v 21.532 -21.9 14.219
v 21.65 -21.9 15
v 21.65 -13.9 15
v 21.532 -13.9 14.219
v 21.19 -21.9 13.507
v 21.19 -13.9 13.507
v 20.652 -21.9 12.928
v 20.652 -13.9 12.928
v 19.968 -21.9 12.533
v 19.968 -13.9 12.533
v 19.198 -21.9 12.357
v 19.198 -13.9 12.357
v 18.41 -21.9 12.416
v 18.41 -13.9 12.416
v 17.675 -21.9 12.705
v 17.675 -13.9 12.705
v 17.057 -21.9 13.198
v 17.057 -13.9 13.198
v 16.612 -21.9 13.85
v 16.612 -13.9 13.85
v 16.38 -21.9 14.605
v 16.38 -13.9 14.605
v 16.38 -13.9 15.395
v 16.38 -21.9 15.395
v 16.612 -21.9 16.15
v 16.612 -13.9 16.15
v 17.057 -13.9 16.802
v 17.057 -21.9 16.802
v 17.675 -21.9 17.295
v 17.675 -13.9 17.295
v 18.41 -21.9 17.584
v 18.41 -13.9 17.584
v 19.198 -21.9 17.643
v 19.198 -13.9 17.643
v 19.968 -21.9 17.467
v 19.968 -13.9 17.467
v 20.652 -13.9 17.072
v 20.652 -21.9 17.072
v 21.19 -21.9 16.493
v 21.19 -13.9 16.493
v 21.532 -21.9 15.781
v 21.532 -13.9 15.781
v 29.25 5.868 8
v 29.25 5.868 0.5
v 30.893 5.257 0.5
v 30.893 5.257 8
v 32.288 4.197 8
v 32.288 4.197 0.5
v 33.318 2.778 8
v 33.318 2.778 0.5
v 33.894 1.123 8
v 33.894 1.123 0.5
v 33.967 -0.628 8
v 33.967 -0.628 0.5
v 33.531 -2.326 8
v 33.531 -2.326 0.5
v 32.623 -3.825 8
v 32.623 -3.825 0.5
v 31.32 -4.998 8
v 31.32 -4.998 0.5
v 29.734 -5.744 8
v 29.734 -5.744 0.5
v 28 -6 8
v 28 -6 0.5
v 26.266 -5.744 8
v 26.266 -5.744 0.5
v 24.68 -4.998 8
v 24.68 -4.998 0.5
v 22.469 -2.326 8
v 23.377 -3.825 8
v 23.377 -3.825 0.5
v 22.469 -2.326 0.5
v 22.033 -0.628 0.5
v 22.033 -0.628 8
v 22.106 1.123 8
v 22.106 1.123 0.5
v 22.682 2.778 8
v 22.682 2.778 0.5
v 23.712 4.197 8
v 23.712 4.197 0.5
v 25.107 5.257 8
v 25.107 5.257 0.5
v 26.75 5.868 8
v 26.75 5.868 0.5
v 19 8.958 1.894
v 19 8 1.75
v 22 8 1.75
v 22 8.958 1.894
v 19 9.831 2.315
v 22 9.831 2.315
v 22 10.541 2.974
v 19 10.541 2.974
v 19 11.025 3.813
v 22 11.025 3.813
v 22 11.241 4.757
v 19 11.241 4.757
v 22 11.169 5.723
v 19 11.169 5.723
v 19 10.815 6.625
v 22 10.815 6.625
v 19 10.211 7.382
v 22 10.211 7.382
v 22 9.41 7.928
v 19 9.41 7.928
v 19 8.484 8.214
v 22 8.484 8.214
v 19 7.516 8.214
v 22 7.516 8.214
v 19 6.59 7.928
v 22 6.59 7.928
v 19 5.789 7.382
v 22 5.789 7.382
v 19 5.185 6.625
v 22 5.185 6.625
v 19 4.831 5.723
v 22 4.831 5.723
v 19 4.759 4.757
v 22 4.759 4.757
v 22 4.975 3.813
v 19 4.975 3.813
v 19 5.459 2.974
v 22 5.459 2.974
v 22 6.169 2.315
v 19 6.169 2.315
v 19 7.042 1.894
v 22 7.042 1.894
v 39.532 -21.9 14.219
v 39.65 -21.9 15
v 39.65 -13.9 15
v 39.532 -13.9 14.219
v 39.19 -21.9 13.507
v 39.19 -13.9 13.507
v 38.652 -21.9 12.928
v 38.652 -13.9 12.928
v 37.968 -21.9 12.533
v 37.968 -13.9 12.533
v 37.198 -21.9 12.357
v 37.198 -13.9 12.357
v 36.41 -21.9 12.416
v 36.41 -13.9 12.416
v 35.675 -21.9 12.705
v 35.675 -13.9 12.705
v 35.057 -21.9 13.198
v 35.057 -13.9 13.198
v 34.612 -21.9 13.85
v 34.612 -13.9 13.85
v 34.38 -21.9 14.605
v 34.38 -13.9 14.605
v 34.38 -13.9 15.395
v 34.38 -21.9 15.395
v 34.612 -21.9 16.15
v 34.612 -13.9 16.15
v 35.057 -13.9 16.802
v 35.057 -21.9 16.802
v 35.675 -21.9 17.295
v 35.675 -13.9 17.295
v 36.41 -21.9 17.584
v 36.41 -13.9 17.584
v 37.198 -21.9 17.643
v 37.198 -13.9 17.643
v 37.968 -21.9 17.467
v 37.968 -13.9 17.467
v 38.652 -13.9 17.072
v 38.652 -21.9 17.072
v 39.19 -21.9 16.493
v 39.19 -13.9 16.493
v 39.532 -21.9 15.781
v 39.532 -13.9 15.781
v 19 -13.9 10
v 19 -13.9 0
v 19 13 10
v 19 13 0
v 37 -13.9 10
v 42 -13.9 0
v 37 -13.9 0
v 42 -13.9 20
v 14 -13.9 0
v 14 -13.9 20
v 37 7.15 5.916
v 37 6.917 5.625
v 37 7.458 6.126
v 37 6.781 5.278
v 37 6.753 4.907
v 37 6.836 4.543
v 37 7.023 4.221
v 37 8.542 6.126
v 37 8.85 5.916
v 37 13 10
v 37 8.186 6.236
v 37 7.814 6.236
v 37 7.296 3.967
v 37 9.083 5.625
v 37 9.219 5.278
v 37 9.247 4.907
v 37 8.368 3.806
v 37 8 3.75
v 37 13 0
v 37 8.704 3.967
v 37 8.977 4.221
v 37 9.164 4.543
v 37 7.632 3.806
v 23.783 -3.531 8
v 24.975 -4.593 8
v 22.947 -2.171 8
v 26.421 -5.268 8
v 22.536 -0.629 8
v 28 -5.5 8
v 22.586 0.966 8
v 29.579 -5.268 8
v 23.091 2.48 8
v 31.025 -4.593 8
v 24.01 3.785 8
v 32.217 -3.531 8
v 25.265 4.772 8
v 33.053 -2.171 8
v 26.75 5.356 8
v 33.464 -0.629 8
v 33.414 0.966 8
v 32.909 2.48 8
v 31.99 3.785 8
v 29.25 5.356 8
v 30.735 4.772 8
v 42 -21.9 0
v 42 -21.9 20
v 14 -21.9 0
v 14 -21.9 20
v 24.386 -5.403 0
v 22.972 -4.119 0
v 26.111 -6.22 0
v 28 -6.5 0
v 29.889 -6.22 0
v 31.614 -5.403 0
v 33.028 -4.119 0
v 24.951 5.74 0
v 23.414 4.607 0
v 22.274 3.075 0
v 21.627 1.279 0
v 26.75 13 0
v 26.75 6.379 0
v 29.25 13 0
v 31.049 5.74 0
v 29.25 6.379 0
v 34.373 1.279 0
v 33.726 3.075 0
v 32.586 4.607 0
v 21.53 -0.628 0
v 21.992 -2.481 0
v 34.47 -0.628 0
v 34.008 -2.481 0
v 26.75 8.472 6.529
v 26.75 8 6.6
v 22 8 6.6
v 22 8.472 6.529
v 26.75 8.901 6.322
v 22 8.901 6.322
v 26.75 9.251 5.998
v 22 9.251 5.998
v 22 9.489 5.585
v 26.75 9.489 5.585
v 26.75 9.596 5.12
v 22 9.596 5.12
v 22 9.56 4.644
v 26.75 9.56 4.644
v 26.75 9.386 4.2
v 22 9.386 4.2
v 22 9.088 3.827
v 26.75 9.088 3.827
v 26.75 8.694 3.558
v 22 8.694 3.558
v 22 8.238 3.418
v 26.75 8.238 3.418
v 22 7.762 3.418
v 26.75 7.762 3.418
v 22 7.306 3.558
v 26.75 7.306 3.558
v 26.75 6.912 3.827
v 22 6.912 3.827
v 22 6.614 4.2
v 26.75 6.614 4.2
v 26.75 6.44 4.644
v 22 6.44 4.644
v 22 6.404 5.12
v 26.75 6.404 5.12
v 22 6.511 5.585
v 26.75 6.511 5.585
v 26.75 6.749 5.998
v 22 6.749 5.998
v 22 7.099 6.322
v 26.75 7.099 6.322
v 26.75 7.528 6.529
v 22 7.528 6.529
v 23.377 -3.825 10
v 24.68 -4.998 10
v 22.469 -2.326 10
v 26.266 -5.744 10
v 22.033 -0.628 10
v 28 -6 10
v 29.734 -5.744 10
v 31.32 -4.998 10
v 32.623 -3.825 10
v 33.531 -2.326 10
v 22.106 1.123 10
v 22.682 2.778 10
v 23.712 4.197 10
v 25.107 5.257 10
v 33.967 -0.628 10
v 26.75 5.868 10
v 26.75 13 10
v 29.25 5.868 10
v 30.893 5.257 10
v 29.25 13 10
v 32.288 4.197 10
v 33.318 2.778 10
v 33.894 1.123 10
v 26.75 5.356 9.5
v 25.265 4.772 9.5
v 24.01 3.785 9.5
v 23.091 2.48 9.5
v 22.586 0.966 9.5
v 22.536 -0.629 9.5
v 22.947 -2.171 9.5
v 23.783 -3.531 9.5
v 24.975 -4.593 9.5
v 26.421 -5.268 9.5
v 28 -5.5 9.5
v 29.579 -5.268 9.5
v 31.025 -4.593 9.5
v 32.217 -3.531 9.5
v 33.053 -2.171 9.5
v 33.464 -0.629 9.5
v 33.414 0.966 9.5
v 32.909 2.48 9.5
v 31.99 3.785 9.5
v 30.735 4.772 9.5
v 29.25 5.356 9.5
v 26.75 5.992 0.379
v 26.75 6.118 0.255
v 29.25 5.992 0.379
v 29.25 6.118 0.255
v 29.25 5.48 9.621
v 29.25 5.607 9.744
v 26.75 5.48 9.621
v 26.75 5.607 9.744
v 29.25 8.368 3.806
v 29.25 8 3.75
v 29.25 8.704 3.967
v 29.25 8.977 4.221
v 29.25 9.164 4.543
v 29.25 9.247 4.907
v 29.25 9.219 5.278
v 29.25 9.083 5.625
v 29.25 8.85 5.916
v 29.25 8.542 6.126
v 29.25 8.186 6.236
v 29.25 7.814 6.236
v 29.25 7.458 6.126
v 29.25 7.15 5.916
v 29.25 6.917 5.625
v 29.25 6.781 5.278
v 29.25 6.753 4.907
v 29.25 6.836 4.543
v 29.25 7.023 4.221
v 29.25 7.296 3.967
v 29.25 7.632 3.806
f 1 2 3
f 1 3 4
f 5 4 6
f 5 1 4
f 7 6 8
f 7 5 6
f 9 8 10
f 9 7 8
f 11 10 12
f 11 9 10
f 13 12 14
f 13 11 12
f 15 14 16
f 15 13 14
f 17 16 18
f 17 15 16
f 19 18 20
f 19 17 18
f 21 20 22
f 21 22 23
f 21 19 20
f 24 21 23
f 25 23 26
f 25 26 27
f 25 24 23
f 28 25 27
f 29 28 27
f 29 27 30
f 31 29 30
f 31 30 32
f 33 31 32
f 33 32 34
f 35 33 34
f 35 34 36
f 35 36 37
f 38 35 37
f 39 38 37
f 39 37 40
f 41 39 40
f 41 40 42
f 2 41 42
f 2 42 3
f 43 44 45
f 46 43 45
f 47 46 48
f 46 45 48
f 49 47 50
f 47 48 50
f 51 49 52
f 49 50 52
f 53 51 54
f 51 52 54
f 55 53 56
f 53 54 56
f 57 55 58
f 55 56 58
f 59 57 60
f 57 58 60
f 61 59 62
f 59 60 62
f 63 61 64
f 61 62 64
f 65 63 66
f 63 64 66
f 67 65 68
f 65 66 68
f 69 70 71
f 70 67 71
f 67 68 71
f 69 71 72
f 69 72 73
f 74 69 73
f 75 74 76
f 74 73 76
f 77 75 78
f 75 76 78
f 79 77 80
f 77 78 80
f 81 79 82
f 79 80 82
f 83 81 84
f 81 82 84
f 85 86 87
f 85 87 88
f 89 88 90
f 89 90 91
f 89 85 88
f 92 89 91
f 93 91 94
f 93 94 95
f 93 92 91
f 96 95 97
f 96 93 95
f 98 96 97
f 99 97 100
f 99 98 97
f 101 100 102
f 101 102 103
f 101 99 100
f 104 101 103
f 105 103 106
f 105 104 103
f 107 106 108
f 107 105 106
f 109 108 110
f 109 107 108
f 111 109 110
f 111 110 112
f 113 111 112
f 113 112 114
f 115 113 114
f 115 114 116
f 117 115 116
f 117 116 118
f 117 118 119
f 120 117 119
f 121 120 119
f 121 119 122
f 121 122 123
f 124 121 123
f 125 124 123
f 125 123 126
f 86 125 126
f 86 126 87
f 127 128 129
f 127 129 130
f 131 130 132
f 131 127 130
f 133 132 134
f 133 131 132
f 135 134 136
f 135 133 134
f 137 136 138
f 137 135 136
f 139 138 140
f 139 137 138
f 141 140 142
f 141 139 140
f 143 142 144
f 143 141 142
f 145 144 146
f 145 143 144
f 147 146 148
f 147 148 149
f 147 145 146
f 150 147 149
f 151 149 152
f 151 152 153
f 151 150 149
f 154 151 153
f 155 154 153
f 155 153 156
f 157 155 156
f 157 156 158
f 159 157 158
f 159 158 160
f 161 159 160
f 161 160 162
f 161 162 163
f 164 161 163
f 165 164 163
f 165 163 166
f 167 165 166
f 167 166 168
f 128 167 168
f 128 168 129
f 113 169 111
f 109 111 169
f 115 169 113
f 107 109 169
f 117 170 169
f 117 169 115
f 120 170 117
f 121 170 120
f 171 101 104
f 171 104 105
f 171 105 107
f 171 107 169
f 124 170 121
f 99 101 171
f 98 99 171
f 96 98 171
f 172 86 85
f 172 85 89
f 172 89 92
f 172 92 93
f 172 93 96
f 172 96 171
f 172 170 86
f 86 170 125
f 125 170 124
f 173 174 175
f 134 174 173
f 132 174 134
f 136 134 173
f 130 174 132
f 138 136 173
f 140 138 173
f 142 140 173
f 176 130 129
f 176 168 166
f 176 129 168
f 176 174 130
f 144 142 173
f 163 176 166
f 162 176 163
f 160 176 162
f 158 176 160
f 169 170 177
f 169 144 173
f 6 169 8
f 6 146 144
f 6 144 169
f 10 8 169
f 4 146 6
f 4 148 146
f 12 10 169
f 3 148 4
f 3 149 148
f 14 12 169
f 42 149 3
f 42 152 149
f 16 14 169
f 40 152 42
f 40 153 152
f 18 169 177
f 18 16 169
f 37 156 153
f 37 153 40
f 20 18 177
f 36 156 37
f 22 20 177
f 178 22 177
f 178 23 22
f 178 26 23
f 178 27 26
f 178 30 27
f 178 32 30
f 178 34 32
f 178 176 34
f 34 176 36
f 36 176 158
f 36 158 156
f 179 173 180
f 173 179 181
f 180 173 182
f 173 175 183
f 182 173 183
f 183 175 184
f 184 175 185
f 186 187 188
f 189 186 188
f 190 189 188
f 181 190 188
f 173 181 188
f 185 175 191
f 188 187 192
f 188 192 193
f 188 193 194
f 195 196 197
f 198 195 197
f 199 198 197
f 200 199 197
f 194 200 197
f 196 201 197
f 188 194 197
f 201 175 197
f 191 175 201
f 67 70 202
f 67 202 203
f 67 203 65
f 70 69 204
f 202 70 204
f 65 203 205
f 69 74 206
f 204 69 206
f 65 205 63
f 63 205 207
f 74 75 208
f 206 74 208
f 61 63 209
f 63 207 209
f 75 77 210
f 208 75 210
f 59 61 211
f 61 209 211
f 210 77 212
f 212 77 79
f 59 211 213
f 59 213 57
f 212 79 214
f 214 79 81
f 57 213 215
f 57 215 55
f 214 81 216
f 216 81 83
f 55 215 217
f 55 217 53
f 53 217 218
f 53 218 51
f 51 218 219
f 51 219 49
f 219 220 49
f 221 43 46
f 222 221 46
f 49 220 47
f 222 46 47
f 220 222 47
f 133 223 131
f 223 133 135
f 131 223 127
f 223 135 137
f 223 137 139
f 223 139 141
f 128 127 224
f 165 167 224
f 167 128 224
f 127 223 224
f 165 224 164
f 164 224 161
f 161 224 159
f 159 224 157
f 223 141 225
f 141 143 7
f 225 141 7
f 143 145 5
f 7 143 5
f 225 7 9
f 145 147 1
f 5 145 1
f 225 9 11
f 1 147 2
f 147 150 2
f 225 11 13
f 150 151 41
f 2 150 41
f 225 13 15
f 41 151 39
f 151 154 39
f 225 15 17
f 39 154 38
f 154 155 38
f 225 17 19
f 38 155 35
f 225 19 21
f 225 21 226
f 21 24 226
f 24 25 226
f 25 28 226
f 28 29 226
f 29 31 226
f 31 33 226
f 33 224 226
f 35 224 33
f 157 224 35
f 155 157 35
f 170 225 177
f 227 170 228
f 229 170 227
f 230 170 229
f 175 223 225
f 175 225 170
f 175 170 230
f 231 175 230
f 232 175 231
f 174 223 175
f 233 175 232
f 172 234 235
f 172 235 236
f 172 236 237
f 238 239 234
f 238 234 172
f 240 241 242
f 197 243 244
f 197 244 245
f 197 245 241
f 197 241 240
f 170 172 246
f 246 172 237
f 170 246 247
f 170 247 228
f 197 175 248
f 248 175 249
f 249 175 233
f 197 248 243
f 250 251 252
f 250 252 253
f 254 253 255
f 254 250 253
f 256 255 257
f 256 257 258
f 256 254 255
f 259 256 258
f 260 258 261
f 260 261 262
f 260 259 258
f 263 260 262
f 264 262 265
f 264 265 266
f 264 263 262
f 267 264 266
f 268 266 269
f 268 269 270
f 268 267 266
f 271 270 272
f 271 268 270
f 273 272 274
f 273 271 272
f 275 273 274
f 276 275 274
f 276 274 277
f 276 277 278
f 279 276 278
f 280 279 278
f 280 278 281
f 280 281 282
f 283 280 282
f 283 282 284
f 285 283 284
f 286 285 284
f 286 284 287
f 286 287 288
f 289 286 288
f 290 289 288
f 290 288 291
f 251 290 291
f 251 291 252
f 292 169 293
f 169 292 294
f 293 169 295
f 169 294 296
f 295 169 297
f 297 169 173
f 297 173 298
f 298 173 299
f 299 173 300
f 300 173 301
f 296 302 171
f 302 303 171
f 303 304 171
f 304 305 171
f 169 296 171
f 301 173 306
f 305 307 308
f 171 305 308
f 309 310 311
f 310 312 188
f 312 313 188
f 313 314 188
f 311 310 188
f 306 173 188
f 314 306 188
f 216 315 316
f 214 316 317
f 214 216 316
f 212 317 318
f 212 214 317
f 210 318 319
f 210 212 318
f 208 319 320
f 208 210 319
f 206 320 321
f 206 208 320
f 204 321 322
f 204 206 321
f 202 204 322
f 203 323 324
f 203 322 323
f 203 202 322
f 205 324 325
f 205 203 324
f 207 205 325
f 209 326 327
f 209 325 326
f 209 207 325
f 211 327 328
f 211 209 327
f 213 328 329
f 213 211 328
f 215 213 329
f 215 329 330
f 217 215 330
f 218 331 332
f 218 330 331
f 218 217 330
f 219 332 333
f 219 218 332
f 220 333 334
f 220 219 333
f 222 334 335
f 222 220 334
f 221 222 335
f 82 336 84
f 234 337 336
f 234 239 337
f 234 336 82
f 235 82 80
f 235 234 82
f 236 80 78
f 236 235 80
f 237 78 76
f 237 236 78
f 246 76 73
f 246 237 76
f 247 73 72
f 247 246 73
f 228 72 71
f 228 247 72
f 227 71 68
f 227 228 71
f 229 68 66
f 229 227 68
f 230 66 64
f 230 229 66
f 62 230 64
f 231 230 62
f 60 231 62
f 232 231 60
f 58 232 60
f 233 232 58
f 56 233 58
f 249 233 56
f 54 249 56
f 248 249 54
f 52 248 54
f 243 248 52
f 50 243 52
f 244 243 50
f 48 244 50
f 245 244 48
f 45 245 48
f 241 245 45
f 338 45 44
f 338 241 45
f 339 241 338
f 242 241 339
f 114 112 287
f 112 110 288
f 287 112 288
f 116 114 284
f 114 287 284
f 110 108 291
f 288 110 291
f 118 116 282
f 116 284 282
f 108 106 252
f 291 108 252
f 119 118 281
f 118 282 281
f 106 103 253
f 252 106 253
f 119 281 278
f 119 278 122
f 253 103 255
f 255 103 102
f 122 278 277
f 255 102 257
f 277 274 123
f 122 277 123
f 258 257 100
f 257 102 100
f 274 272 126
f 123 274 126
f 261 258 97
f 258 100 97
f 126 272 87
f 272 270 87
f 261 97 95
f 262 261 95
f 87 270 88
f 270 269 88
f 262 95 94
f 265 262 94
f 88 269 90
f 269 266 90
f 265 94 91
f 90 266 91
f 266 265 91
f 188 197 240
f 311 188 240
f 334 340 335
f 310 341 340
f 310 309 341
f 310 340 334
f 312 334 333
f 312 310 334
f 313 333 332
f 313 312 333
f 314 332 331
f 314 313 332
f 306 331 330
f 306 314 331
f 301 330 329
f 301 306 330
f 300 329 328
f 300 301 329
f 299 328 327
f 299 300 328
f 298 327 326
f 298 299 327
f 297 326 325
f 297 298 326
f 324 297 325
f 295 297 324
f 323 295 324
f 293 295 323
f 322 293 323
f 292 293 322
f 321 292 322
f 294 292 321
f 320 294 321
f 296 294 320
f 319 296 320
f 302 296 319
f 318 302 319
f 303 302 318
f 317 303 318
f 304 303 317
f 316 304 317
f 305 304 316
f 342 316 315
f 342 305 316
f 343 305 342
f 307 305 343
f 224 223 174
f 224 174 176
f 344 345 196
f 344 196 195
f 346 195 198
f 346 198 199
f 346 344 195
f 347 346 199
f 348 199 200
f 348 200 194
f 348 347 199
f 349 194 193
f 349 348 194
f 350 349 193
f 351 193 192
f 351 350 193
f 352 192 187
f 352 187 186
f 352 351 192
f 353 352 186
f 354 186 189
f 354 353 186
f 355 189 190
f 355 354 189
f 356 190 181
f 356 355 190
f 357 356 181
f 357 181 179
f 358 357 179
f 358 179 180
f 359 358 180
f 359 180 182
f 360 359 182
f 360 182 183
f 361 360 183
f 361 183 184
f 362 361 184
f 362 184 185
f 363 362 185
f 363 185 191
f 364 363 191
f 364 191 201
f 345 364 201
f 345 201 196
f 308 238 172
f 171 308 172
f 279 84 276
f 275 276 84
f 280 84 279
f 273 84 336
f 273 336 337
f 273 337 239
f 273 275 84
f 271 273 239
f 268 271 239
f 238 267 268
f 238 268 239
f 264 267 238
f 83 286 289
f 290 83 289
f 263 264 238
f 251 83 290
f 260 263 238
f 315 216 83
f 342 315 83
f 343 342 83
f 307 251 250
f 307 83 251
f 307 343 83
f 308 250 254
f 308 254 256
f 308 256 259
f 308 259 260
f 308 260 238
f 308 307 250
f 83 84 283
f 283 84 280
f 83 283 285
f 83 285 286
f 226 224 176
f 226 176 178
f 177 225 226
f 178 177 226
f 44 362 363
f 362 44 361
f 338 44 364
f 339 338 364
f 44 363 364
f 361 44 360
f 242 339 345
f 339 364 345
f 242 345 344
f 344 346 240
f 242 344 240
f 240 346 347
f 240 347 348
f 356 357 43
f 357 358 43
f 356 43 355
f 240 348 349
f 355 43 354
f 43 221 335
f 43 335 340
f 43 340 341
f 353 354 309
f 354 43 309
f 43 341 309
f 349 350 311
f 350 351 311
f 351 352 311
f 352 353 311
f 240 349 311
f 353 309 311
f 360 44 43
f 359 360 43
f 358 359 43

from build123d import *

# Parameters (mm, degrees)
SKETCH1_W                      = 18
SKETCH1_H                      = 34.9
SKETCH1_R                      = 6
BOSS_EXTRUDE1_DEPTH            = 10
BOSS_EXTRUDE2_START            = 2
SKETCH2_R                      = 6
SKETCH2_R_2                    = 5.5
BOSS_EXTRUDE2_DEPTH            = 2
SKETCH3_W                      = 2.5
SKETCH3_H                      = 7.643928679
CUT_EXTRUDE1_DEPTH             = 26.702334524
CBORE_FOR_M3_SHCS1_D           = 3.2
CBORE_FOR_M3_SHCS1_DEPTH       = 7.75
CBORE_FOR_M3_SHCS1_CBORE_D     = 6.5
CBORE_FOR_M3_SHCS1_CBORE_DEPTH = 3
TAP_DRILL_FOR_M3X0_5_TAP1_D    = 2.5
CHAMFER1_SIZE                  = 0.5
SKETCH11_W                     = 10
SKETCH11_H                     = 8
BOSS_EXTRUDE4_DEPTH            = 5
SKETCH8_W                      = 28
SKETCH8_H                      = 10
BOSS_EXTRUDE3_DEPTH            = 8
M5_CLEARANCE_HOLE1_D           = 5.3


with BuildPart() as part:
    # Sketch1 → Boss-Extrude1 (new body)
    with BuildSketch(Plane.XY):
        with Locations((0, -4.45)):
            Rectangle(SKETCH1_W, SKETCH1_H)
        Circle(SKETCH1_R, mode=Mode.SUBTRACT)
    extrude(amount=BOSS_EXTRUDE1_DEPTH)

    # Sketch2 → Boss-Extrude2 (add)
    with BuildSketch(Plane(origin=(0, 0, 10), x_dir=(-1, 0, 0), z_dir=(0, 0, -1)).offset(BOSS_EXTRUDE2_START)):
        Circle(SKETCH2_R)
        Circle(SKETCH2_R_2, mode=Mode.SUBTRACT)
    extrude(amount=-BOSS_EXTRUDE2_DEPTH)

    # Sketch3 → Cut-Extrude1 (cut, through all)
    with BuildSketch(Plane.XY.offset(10)):
        with Locations((0, 9.178035661)):
            Rectangle(SKETCH3_W, SKETCH3_H)
    extrude(amount=-CUT_EXTRUDE1_DEPTH, mode=Mode.SUBTRACT)

    # CBORE for M3 SHCS1
    with Locations(Plane(origin=(9, 0, 0), x_dir=(0, 0, -1), z_dir=(1, 0, 0))):
        with Locations((-5, 8)):
            CounterBoreHole(CBORE_FOR_M3_SHCS1_D / 2, CBORE_FOR_M3_SHCS1_CBORE_D / 2, CBORE_FOR_M3_SHCS1_CBORE_DEPTH, depth=CBORE_FOR_M3_SHCS1_DEPTH)

    # Tap Drill for M3x0.5 Tap1 (through all)
    with Locations(Plane.ZY.offset(9)):
        with Locations((5, 8)):
            Hole(TAP_DRILL_FOR_M3X0_5_TAP1_D / 2)

    # Chamfer1
    chamfer1_edges = [part.edges().sort_by_distance(p)[0] for p in [
        (0, -5.5, 10),
        (0, -6, 0),
    ]]
    chamfer(chamfer1_edges, length=CHAMFER1_SIZE)

    # Sketch11 → Boss-Extrude4 (add)
    with BuildSketch(Plane.ZY.offset(9)):
        with Locations((5, -17.9)):
            Rectangle(SKETCH11_W, SKETCH11_H)
    boss_extrude4 = extrude(amount=BOSS_EXTRUDE4_DEPTH)

    # Mirror1: Boss-Extrude4 across plane
    add(boss_extrude4.mirror(Plane(origin=(0, 0, 0), x_dir=(0, 0, 1), z_dir=(1, 0, 0))))

    # Sketch8 → Boss-Extrude3 (add)
    with BuildSketch(Plane.XZ.offset(21.9)):
        with Locations((0, 15)):
            Rectangle(SKETCH8_W, SKETCH8_H)
    extrude(amount=-BOSS_EXTRUDE3_DEPTH)

    # M5 Clearance Hole1 (through all)
    with Locations(Plane(origin=(0, -13.9, 0), x_dir=(1, 0, 0), z_dir=(0, 1, 0))):
        with Locations((-9, -15), (9, -15)):
            Hole(M5_CLEARANCE_HOLE1_D / 2)


with BuildPart() as body_2:
    # Mirror2: mirrored copy
    add(part.part.mirror(Plane.ZY.offset(-14)))


solid = body_2.part
